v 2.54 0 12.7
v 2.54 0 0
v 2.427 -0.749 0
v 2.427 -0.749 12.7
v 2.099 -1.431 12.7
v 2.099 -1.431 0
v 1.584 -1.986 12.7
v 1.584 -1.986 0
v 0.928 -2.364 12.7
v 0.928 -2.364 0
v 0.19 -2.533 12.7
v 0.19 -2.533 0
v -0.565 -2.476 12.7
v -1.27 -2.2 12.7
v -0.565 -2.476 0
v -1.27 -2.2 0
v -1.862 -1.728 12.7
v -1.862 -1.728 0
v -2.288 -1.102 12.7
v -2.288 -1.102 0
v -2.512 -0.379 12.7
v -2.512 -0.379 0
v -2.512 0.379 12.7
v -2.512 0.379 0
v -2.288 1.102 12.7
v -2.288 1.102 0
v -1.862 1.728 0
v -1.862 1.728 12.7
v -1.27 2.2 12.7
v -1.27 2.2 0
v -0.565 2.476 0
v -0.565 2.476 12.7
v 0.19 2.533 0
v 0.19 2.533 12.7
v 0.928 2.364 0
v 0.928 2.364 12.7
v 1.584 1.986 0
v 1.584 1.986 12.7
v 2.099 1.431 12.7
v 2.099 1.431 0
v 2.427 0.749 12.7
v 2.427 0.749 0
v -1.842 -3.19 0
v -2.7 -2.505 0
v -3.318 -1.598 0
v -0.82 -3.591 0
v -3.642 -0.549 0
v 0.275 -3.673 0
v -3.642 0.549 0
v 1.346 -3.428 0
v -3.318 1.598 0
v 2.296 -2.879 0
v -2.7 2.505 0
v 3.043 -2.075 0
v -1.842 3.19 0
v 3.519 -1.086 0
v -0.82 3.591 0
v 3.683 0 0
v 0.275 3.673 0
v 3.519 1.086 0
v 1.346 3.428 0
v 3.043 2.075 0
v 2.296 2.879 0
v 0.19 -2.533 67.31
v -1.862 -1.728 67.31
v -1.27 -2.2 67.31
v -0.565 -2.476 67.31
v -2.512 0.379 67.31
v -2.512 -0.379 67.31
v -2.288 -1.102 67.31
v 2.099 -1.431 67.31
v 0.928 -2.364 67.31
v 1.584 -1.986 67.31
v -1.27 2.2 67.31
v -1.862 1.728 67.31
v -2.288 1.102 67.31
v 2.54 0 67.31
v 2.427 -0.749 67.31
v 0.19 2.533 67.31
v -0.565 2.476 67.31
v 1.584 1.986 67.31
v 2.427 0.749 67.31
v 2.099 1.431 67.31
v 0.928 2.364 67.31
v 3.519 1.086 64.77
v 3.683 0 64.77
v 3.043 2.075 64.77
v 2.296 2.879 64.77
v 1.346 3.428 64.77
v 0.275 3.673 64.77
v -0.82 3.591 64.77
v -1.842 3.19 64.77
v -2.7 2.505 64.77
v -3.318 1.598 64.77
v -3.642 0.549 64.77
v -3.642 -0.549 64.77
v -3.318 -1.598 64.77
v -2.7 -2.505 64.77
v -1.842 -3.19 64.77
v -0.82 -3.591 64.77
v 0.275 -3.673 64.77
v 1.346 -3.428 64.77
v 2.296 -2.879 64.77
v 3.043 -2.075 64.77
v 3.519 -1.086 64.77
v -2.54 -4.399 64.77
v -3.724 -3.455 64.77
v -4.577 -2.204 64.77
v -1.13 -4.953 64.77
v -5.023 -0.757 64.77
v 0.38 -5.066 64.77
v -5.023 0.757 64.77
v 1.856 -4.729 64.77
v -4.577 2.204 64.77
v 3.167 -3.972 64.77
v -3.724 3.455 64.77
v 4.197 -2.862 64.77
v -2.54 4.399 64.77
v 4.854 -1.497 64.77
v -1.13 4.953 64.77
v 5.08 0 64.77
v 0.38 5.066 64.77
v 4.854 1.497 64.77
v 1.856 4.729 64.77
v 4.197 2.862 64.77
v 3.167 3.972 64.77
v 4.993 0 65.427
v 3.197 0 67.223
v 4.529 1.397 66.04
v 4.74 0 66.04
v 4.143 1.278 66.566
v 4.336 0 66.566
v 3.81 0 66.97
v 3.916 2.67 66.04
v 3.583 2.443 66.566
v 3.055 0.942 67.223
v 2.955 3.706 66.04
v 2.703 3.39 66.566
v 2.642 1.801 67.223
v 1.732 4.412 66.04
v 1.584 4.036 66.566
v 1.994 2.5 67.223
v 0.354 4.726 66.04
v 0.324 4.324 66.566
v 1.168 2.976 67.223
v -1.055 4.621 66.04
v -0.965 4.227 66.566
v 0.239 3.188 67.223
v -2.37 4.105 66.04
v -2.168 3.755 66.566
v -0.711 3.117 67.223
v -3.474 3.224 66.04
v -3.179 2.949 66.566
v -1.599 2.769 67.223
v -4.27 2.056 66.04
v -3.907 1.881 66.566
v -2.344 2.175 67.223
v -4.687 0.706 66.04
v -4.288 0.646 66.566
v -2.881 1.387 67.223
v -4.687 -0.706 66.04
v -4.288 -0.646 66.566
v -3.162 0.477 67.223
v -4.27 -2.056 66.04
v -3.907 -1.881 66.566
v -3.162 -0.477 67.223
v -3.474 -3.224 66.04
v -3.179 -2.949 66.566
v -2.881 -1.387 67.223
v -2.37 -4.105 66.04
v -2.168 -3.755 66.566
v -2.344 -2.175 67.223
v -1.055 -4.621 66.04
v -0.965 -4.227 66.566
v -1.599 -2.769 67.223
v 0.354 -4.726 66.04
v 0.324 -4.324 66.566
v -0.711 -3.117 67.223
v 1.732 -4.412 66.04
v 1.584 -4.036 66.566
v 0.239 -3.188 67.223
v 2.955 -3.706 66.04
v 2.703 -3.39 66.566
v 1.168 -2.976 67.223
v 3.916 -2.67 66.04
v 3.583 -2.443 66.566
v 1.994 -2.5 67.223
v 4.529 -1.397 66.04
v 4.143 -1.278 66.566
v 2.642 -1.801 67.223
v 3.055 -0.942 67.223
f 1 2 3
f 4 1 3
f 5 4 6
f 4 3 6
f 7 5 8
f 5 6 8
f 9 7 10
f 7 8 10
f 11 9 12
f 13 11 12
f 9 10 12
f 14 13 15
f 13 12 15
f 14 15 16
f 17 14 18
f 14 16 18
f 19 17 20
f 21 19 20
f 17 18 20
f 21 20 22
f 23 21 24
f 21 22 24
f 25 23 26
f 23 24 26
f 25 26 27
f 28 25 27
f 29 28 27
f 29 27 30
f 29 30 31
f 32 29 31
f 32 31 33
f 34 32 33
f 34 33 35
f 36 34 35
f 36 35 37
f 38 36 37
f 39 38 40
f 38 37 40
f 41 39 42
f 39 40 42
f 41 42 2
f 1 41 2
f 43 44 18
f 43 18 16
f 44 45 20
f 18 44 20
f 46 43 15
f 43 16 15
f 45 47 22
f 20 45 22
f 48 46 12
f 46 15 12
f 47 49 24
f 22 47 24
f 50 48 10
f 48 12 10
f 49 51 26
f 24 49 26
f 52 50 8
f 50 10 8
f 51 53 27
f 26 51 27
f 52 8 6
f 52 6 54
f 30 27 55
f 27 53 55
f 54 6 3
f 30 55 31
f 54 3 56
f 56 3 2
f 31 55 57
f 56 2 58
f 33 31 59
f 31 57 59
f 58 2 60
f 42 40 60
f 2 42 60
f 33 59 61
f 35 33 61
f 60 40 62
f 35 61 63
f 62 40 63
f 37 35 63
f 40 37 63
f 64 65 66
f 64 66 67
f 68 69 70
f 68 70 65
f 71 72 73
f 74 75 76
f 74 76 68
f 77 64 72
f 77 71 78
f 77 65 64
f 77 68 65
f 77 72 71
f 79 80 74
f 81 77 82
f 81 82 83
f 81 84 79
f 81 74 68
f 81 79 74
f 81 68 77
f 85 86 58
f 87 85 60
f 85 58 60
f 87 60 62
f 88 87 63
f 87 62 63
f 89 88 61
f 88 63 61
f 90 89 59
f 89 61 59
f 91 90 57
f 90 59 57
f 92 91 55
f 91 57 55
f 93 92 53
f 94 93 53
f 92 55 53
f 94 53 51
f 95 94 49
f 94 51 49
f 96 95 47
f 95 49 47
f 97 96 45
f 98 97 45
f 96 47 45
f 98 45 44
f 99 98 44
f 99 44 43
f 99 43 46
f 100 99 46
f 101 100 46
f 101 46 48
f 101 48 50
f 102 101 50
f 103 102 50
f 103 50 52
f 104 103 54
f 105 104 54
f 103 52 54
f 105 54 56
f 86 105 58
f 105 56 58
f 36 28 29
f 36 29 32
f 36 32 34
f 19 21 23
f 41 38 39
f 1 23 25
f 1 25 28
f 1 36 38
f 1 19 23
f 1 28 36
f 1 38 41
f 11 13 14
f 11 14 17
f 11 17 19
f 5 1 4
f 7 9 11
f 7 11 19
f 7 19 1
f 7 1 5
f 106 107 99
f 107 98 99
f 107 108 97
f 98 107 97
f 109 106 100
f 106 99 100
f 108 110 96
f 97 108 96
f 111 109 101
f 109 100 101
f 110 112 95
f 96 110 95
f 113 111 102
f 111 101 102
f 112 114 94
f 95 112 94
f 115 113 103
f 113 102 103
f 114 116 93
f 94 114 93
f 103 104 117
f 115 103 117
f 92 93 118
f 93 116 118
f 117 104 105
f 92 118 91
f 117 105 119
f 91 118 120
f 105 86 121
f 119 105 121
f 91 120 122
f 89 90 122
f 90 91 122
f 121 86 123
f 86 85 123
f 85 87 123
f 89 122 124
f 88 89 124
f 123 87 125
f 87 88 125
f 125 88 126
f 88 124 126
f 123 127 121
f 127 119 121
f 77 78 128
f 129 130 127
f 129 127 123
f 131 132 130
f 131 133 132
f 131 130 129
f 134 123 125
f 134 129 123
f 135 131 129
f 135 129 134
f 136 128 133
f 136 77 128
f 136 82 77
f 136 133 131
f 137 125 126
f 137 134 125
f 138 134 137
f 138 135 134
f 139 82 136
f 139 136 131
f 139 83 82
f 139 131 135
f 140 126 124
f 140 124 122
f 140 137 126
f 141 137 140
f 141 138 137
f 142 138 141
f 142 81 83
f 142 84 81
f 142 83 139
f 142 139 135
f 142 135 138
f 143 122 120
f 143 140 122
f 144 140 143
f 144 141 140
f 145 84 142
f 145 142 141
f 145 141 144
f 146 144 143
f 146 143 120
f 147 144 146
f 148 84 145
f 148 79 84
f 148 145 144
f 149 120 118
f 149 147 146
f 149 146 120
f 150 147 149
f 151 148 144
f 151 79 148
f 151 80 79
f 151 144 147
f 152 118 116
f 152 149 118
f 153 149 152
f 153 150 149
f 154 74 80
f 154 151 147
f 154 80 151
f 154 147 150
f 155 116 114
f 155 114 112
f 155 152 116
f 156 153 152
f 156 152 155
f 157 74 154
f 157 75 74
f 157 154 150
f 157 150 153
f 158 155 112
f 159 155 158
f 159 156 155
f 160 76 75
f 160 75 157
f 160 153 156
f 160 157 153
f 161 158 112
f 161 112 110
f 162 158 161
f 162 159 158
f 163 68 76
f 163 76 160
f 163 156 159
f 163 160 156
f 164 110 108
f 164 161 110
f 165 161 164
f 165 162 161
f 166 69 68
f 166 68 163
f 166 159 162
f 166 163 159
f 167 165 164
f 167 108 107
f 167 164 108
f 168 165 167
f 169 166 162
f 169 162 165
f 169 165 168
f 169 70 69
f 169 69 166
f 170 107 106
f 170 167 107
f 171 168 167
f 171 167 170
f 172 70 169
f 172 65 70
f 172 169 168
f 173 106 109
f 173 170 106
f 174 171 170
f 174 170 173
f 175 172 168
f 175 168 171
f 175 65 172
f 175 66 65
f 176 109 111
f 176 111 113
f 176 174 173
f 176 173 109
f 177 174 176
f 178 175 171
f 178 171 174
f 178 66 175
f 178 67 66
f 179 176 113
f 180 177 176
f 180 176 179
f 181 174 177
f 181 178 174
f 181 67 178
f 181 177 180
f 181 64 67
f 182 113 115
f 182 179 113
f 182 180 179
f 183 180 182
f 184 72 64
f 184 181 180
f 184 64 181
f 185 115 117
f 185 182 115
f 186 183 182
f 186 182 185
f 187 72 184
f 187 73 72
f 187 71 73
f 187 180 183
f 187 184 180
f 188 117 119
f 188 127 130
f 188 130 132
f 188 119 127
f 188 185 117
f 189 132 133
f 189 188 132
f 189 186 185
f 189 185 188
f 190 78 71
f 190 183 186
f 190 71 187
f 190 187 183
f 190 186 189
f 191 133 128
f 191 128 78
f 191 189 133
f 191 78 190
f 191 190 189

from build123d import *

# Parameters (mm, degrees)
F0_R     = 3.683
F1_DEPTH = 64.77
F2_R     = 5.08
F3_DEPTH = 2.54
F4_R     = 2.53999
F5_R     = 2.54
F6_DEPTH = 12.7


# Not quite as in the source:
# - a fillet or chamfer is up to 0.001 mm smaller than in the source, because OpenCascade refuses the exact size


with BuildPart() as f1:
    # F0 (on Top) → F1 (new body)
    with BuildSketch(Plane.XY):
        Circle(F0_R)
    extrude(amount=F1_DEPTH)

    # F2 (on face) → F3 (join)
    with BuildSketch(Plane.XY.offset(64.77)):
        Circle(F2_R)
    extrude(amount=F3_DEPTH)

    # F4 (radius 2.54 in the source; OpenCascade refuses exactly that, so slightly less here)
    f4_edges = [f1.edges().sort_by_distance(p)[0] for p in [
        (-5.08, 0, 67.31),
    ]]
    fillet(f4_edges, radius=F4_R)

    # F5 (on face) → F6 (cut)
    with BuildSketch(Plane(origin=(0, 0, 0), x_dir=(1, 0, 0), z_dir=(0, 0, -1))):
        Circle(F5_R)
    extrude(amount=-F6_DEPTH, mode=Mode.SUBTRACT)


solid = f1.part
